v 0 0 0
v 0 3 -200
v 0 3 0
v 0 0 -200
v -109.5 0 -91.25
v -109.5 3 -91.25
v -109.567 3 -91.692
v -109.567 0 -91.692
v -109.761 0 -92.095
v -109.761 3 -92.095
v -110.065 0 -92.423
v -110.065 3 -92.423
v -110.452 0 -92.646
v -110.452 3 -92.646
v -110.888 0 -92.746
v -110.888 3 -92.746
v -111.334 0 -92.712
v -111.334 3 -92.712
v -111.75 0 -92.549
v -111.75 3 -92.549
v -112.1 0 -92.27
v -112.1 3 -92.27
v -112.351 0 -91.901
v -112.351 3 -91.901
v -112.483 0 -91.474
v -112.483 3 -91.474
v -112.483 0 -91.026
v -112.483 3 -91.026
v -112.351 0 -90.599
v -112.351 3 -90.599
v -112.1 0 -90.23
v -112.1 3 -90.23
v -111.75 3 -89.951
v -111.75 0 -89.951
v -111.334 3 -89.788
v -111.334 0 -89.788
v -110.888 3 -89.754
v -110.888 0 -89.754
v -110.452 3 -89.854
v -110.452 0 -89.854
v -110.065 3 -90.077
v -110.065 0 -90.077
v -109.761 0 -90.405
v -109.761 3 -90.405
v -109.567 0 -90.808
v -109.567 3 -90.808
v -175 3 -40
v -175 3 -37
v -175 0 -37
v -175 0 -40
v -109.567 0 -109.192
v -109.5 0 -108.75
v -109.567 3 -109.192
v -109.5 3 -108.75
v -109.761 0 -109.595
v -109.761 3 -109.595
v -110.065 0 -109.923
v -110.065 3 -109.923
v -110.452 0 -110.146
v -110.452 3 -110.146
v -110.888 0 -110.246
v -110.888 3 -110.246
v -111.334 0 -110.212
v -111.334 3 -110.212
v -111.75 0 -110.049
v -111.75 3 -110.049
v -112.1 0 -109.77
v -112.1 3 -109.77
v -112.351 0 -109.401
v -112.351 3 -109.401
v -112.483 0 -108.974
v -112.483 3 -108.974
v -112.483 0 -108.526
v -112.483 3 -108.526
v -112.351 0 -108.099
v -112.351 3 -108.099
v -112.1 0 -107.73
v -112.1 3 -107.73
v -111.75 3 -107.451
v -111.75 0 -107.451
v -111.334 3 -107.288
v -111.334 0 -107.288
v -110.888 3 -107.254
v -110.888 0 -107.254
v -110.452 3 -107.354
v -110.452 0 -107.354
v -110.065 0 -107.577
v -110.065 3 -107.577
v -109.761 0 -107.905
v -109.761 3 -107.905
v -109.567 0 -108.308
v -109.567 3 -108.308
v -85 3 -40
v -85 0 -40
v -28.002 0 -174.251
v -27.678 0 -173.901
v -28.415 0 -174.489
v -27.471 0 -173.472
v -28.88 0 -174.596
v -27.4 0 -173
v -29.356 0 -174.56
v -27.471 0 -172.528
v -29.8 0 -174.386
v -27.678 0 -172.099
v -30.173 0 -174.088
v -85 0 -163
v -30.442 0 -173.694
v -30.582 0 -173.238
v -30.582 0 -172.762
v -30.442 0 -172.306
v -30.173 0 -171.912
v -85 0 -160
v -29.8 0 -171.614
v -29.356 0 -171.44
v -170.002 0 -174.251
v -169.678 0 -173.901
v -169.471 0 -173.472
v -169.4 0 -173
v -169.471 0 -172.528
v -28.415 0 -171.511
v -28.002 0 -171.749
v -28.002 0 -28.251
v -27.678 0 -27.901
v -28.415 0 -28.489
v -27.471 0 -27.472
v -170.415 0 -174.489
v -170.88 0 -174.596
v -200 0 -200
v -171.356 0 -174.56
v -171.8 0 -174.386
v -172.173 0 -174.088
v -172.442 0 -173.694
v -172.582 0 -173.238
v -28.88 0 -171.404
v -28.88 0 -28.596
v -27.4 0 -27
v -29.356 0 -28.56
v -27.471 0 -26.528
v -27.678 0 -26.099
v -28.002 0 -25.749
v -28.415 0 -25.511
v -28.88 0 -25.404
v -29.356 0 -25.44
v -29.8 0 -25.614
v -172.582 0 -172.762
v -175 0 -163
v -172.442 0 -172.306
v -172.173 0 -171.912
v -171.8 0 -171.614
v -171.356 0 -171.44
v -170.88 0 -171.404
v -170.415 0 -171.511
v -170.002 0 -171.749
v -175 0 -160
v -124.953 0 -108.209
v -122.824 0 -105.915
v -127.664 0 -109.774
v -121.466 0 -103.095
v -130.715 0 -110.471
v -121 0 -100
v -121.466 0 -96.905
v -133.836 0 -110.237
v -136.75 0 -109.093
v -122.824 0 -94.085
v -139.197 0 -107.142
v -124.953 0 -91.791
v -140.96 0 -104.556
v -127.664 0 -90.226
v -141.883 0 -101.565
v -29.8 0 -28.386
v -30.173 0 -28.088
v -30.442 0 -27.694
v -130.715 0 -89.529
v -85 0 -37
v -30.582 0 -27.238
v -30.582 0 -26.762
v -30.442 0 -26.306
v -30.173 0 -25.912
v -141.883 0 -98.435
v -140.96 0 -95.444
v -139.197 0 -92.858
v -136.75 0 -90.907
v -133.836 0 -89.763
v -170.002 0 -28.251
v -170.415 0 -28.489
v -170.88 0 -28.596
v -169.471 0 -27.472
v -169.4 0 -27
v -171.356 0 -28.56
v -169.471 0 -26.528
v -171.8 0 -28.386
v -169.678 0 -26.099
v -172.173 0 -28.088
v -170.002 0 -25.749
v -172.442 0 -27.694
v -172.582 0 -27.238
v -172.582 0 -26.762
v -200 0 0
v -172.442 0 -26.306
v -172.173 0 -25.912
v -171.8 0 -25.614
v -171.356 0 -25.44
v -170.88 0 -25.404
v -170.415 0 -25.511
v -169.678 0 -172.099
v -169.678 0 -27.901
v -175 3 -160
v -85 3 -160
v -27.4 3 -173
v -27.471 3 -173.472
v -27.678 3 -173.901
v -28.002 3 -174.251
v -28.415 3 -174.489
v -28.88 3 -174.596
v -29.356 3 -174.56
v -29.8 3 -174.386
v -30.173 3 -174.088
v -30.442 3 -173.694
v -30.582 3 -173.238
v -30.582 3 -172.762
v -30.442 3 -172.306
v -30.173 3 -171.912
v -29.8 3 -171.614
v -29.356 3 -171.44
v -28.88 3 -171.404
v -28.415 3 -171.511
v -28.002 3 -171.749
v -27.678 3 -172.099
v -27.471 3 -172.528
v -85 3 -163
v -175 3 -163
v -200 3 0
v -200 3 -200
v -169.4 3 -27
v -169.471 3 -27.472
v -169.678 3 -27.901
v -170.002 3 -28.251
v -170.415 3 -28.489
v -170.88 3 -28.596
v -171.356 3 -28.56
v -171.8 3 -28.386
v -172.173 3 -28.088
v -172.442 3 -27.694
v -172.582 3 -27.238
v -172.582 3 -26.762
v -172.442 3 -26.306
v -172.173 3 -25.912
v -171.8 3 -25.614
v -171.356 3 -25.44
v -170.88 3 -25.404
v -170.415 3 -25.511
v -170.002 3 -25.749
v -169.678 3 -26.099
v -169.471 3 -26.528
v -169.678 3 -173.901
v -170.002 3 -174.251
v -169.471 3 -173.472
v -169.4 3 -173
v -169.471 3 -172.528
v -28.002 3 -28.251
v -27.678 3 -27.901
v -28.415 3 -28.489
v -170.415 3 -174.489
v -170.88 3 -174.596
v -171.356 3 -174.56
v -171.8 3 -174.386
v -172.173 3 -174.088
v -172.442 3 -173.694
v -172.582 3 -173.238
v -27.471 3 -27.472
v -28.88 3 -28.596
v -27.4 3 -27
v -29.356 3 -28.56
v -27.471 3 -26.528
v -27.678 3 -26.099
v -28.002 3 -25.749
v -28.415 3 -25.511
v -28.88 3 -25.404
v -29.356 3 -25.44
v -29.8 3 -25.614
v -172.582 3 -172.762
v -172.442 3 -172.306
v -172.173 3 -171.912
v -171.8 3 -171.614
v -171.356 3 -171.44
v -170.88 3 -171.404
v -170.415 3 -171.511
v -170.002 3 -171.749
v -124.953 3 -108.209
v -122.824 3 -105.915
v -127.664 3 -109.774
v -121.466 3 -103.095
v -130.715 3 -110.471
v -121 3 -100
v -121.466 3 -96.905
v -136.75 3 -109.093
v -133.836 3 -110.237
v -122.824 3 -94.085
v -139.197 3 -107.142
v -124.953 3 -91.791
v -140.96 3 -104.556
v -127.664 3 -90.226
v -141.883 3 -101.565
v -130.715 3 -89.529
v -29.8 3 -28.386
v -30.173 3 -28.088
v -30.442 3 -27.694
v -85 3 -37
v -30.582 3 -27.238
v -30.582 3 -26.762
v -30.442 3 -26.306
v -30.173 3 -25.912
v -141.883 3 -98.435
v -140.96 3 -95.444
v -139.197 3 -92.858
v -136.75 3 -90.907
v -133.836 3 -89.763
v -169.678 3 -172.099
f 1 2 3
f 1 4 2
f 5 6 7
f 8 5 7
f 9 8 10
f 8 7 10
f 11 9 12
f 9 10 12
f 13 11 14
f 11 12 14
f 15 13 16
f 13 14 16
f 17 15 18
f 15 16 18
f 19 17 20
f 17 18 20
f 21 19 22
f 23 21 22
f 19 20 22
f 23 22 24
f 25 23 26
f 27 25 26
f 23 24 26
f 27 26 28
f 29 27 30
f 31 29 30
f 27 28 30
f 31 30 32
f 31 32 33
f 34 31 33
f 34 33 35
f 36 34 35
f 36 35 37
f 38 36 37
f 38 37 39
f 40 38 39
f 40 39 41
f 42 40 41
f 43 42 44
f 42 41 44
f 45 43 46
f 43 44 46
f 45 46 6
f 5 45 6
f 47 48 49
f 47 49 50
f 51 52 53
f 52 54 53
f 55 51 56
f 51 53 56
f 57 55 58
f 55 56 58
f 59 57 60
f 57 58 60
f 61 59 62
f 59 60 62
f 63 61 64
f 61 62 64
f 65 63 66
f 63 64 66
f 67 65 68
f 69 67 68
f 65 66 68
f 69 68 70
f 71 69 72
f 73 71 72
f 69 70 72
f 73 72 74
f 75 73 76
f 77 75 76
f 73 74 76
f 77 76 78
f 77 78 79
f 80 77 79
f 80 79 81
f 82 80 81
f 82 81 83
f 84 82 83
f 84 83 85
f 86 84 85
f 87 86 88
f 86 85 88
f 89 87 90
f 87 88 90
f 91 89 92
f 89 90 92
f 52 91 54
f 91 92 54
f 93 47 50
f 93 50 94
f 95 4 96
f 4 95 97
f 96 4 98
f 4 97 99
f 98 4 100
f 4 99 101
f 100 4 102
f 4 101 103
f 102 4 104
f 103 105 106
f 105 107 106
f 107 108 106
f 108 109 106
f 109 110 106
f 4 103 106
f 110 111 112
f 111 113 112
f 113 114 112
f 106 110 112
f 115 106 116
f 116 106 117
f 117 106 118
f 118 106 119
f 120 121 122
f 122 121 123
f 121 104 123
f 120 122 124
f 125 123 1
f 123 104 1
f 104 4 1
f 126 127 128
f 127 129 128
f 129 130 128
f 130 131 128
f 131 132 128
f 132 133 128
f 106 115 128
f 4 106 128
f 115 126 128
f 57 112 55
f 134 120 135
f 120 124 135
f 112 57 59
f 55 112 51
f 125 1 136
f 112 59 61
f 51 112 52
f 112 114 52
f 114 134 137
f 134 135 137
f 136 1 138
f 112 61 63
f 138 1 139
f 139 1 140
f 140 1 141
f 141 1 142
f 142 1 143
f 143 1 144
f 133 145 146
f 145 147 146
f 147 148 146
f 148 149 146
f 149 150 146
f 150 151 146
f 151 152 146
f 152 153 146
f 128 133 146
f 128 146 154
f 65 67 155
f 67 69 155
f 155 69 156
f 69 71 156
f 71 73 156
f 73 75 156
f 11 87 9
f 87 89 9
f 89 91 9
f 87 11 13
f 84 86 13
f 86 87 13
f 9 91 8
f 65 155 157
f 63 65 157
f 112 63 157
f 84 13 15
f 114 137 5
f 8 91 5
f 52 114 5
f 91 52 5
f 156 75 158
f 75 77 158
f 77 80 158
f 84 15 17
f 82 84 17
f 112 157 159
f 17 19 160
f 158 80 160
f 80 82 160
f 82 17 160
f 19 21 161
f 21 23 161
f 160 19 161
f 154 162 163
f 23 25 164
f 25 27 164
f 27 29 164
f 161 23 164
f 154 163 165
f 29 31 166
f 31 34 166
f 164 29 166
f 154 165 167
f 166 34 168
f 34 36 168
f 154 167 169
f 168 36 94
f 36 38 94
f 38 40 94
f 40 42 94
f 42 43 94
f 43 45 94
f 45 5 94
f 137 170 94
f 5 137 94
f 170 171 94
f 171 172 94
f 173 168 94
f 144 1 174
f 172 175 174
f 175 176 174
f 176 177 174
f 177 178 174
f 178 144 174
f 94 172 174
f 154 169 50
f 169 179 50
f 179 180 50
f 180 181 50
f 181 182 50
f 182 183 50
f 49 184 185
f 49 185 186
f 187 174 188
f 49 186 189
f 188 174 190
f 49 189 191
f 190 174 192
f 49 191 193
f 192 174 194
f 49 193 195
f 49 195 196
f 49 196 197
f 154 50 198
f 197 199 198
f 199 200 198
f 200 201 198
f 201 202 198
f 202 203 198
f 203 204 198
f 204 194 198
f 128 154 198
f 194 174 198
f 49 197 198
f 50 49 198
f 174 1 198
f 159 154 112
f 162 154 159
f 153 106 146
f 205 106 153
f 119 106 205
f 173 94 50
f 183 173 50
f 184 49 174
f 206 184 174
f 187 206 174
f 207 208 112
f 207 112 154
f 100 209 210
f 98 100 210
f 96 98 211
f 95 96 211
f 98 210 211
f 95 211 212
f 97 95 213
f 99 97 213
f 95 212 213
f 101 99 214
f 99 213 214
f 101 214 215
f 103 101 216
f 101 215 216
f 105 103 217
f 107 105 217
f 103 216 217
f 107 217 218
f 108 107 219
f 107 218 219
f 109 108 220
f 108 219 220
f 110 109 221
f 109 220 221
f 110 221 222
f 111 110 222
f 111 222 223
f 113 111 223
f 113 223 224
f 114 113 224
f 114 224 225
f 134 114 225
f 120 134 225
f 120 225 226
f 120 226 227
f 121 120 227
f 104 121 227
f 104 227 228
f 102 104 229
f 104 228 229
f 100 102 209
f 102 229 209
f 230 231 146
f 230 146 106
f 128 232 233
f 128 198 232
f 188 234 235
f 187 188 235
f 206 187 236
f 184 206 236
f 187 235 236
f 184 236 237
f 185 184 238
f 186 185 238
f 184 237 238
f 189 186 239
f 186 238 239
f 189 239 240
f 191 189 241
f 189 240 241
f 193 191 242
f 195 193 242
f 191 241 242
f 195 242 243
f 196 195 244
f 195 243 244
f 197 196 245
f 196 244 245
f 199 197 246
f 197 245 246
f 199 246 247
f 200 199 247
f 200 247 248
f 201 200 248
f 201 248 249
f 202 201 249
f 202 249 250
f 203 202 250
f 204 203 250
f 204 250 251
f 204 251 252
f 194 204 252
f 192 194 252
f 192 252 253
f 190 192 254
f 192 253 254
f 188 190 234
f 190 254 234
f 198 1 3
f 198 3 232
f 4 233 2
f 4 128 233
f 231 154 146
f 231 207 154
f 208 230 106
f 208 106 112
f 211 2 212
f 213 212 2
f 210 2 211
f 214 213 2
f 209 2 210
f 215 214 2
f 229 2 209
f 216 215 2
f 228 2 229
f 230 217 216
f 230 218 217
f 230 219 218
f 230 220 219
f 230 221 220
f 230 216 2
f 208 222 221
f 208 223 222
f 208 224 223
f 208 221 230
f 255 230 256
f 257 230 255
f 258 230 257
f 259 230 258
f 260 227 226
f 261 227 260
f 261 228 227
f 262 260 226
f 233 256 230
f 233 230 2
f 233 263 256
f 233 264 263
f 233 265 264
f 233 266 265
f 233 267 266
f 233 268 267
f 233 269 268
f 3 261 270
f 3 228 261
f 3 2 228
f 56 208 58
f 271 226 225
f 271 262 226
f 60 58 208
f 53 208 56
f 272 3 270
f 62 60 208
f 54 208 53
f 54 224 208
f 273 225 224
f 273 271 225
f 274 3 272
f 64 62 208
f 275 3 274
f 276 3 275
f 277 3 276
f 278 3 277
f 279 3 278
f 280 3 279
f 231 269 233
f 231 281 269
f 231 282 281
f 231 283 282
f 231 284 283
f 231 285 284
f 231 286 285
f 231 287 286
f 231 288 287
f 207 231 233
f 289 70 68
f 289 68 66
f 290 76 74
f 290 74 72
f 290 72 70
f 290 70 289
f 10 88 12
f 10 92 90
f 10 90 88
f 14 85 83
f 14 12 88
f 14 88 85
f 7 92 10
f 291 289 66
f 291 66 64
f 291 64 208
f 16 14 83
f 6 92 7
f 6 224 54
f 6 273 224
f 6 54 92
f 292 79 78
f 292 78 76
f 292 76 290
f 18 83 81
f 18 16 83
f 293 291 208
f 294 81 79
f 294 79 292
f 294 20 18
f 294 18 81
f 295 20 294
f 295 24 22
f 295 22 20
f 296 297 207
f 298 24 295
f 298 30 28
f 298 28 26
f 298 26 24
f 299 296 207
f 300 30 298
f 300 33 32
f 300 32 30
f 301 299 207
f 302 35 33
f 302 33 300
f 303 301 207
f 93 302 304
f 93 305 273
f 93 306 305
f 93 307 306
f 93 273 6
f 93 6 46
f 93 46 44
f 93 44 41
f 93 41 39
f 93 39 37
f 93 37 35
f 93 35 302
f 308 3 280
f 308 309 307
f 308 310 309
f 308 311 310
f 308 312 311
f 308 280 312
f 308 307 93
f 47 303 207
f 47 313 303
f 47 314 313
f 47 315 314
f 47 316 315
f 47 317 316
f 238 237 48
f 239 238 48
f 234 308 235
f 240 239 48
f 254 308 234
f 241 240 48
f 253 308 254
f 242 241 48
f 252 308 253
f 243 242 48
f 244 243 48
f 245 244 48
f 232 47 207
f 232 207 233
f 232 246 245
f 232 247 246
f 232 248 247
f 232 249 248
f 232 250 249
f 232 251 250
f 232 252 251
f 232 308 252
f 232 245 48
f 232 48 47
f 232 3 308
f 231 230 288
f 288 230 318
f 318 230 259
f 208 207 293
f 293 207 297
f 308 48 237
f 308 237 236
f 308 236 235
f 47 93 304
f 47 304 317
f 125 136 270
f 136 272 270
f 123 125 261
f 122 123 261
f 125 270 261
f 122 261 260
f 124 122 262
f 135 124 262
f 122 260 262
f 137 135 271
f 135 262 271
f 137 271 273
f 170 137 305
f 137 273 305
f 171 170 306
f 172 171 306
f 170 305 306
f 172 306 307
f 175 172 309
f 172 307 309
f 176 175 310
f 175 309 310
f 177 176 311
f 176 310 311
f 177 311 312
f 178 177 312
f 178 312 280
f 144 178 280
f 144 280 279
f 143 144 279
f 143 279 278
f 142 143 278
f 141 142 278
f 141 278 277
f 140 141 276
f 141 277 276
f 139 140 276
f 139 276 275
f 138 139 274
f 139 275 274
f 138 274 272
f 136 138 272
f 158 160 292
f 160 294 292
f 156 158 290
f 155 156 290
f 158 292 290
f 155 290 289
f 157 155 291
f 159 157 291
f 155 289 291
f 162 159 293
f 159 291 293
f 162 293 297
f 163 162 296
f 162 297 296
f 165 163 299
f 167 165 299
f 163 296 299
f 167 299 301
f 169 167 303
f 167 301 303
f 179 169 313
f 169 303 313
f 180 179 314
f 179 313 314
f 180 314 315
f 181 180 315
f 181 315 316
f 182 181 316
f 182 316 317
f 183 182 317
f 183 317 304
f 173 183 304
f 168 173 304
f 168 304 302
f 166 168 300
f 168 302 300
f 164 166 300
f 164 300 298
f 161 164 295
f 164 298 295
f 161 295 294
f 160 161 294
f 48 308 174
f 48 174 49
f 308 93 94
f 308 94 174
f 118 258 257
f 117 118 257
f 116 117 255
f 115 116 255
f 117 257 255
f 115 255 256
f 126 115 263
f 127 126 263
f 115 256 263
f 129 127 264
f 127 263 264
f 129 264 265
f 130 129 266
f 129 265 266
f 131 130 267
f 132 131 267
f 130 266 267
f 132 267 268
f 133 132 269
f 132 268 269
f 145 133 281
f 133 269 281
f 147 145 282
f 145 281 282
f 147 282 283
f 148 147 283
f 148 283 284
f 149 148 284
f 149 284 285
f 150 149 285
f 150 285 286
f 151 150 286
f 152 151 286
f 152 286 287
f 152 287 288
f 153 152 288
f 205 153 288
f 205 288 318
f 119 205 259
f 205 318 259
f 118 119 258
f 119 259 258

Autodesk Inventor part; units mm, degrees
ref_plane "YZ Plane" through (0, 0, 0) normal (1, 0, 0) x (0, 1, 0)
ref_plane "XZ Plane" through (0, 0, 0) normal (0, 1, 0) x (-1, 0, 0)
ref_plane "XY Plane" through (0, 0, 0) normal (0, 0, 1) x (1, 0, 0)
sketch "Sketch1" plane through (0, 0, 0) normal (0, 1, 0) x (-1, 0, 0)
  line L0 (0, 0) -> (200, 0)
  line L1 (200, 0) -> (200, -200)
  line L2 (200, -200) -> (0, -200)
  line L3 (0, -200) -> (0, 0)
  dimension "d0" = 200
  dimension "d1" = 200
extrude "Extrusion1" add sketch "Sketch1" along normal blind 3
sketch "Sketch4" plane through (0, 3, 0) normal (0, 1, 0) x (1, 0, 0)
  line L0 (-175, 37) -> (-175, 40)
  line L1 (-175, 40) -> (-85, 40)
  line L2 (-85, 40) -> (-85, 37)
  line L3 (-85, 37) -> (-175, 37)
  line L4 (-190, 6) -> (-10, 6) projected
  line L5 (-200, 200) -> (-200, 0) projected
  line L6 (-175, 160) -> (-175, 163)
  line L7 (-175, 163) -> (-85, 163)
  line L8 (-85, 163) -> (-85, 160)
  line L9 (-85, 160) -> (-175, 160)
  line L10 (0, 0) -> (0, 200) projected
  line L11 (-10, 194) -> (-190, 194) projected
  dimension "d24" = 3
  dimension "d25" = 90
  dimension "d26" = 31
  dimension "d27" = 25
  dimension "d28" = 3
  dimension "d29" = 120
  dimension "d30" = 25
  dimension "d31" = 85
  dimension "d52" = 31
extrude "Extrusion4" cut sketch "Sketch4" against normal blind 3
sketch "Sketch5" plane through (0, 3, 0) normal (0, 1, 0) x (1, 0, 0)
  circle A0 centre (-131.5, 100) radius 10.5
  line L0 (-200, 200) -> (-200, 0) projected
  line L1 (-175, 40) -> (-85, 40) projected
  line L2 (-175, 160) -> (-175, 163) projected
  line L3 (-85, 160) -> (-175, 160) projected
  point P0 (0, 0)
  dimension "d34" = 21
  dimension "d37" = 60
  dimension "d40" = 43.5
  dimension "d53" = 60
extrude "Extrusion5" cut sketch "Sketch5" against normal blind 10
sketch "Sketch8" plane through (0, 3, 0) normal (0, 1, 0) x (1, 0, 0)
  circle A0 centre (-131.5, 100) radius 10.5 projected
  point P0 (0, 0)
sketch "Sketch11" plane through (0, 3, 0) normal (0, 1, 0) x (1, 0, 0)
  line L0 (-111, 108.75) -> (-111, 91.25)
  circle A0 centre (-131.5, 100) radius 10.5 projected
  circle A1 centre (-111, 108.75) radius 1.5
  circle A2 centre (-111, 91.25) radius 1.5
  point P0 (0, 0)
  dimension "d60" = 20.5
  dimension "d61" = 3
  dimension "d62" = 3
  dimension "d63" = 17.5
  dimension "d64" = 8.75
extrude "Extrusion8" cut sketch "Sketch11" against normal blind 10 contours A2 | A1
sketch "Sketch12" plane through (0, 3, 0) normal (0, 1, 0) x (1, 0, 0)
  circle A0 centre (-171, 27) radius 1.6
  line L0 (-194, 190) -> (-194, 10) projected
  line L1 (-190, 6) -> (-10, 6) projected
  circle A1 centre (-171, 173) radius 1.6
  line L2 (-10, 194) -> (-190, 194) projected
  circle A2 centre (-29, 27) radius 1.6
  line L3 (-6, 10) -> (-6, 190) projected
  circle A3 centre (-29, 173) radius 1.6
  point P0 (0, 0)
  dimension "d67" = 3.2
  dimension "d68" = 23
  dimension "d69" = 21
  dimension "d70" = 3.2
  dimension "d71" = 21
  dimension "d72" = 23
  dimension "d73" = 3.2
  dimension "d74" = 21
  dimension "d75" = 23
  dimension "d76" = 3.2
  dimension "d77" = 21
  dimension "d78" = 23
extrude "Extrusion9" cut sketch "Sketch12" against normal blind 10
equation "\"d26\" = d52"
equation "\"d37\" = d53"
properties part number "Part 1 base"
